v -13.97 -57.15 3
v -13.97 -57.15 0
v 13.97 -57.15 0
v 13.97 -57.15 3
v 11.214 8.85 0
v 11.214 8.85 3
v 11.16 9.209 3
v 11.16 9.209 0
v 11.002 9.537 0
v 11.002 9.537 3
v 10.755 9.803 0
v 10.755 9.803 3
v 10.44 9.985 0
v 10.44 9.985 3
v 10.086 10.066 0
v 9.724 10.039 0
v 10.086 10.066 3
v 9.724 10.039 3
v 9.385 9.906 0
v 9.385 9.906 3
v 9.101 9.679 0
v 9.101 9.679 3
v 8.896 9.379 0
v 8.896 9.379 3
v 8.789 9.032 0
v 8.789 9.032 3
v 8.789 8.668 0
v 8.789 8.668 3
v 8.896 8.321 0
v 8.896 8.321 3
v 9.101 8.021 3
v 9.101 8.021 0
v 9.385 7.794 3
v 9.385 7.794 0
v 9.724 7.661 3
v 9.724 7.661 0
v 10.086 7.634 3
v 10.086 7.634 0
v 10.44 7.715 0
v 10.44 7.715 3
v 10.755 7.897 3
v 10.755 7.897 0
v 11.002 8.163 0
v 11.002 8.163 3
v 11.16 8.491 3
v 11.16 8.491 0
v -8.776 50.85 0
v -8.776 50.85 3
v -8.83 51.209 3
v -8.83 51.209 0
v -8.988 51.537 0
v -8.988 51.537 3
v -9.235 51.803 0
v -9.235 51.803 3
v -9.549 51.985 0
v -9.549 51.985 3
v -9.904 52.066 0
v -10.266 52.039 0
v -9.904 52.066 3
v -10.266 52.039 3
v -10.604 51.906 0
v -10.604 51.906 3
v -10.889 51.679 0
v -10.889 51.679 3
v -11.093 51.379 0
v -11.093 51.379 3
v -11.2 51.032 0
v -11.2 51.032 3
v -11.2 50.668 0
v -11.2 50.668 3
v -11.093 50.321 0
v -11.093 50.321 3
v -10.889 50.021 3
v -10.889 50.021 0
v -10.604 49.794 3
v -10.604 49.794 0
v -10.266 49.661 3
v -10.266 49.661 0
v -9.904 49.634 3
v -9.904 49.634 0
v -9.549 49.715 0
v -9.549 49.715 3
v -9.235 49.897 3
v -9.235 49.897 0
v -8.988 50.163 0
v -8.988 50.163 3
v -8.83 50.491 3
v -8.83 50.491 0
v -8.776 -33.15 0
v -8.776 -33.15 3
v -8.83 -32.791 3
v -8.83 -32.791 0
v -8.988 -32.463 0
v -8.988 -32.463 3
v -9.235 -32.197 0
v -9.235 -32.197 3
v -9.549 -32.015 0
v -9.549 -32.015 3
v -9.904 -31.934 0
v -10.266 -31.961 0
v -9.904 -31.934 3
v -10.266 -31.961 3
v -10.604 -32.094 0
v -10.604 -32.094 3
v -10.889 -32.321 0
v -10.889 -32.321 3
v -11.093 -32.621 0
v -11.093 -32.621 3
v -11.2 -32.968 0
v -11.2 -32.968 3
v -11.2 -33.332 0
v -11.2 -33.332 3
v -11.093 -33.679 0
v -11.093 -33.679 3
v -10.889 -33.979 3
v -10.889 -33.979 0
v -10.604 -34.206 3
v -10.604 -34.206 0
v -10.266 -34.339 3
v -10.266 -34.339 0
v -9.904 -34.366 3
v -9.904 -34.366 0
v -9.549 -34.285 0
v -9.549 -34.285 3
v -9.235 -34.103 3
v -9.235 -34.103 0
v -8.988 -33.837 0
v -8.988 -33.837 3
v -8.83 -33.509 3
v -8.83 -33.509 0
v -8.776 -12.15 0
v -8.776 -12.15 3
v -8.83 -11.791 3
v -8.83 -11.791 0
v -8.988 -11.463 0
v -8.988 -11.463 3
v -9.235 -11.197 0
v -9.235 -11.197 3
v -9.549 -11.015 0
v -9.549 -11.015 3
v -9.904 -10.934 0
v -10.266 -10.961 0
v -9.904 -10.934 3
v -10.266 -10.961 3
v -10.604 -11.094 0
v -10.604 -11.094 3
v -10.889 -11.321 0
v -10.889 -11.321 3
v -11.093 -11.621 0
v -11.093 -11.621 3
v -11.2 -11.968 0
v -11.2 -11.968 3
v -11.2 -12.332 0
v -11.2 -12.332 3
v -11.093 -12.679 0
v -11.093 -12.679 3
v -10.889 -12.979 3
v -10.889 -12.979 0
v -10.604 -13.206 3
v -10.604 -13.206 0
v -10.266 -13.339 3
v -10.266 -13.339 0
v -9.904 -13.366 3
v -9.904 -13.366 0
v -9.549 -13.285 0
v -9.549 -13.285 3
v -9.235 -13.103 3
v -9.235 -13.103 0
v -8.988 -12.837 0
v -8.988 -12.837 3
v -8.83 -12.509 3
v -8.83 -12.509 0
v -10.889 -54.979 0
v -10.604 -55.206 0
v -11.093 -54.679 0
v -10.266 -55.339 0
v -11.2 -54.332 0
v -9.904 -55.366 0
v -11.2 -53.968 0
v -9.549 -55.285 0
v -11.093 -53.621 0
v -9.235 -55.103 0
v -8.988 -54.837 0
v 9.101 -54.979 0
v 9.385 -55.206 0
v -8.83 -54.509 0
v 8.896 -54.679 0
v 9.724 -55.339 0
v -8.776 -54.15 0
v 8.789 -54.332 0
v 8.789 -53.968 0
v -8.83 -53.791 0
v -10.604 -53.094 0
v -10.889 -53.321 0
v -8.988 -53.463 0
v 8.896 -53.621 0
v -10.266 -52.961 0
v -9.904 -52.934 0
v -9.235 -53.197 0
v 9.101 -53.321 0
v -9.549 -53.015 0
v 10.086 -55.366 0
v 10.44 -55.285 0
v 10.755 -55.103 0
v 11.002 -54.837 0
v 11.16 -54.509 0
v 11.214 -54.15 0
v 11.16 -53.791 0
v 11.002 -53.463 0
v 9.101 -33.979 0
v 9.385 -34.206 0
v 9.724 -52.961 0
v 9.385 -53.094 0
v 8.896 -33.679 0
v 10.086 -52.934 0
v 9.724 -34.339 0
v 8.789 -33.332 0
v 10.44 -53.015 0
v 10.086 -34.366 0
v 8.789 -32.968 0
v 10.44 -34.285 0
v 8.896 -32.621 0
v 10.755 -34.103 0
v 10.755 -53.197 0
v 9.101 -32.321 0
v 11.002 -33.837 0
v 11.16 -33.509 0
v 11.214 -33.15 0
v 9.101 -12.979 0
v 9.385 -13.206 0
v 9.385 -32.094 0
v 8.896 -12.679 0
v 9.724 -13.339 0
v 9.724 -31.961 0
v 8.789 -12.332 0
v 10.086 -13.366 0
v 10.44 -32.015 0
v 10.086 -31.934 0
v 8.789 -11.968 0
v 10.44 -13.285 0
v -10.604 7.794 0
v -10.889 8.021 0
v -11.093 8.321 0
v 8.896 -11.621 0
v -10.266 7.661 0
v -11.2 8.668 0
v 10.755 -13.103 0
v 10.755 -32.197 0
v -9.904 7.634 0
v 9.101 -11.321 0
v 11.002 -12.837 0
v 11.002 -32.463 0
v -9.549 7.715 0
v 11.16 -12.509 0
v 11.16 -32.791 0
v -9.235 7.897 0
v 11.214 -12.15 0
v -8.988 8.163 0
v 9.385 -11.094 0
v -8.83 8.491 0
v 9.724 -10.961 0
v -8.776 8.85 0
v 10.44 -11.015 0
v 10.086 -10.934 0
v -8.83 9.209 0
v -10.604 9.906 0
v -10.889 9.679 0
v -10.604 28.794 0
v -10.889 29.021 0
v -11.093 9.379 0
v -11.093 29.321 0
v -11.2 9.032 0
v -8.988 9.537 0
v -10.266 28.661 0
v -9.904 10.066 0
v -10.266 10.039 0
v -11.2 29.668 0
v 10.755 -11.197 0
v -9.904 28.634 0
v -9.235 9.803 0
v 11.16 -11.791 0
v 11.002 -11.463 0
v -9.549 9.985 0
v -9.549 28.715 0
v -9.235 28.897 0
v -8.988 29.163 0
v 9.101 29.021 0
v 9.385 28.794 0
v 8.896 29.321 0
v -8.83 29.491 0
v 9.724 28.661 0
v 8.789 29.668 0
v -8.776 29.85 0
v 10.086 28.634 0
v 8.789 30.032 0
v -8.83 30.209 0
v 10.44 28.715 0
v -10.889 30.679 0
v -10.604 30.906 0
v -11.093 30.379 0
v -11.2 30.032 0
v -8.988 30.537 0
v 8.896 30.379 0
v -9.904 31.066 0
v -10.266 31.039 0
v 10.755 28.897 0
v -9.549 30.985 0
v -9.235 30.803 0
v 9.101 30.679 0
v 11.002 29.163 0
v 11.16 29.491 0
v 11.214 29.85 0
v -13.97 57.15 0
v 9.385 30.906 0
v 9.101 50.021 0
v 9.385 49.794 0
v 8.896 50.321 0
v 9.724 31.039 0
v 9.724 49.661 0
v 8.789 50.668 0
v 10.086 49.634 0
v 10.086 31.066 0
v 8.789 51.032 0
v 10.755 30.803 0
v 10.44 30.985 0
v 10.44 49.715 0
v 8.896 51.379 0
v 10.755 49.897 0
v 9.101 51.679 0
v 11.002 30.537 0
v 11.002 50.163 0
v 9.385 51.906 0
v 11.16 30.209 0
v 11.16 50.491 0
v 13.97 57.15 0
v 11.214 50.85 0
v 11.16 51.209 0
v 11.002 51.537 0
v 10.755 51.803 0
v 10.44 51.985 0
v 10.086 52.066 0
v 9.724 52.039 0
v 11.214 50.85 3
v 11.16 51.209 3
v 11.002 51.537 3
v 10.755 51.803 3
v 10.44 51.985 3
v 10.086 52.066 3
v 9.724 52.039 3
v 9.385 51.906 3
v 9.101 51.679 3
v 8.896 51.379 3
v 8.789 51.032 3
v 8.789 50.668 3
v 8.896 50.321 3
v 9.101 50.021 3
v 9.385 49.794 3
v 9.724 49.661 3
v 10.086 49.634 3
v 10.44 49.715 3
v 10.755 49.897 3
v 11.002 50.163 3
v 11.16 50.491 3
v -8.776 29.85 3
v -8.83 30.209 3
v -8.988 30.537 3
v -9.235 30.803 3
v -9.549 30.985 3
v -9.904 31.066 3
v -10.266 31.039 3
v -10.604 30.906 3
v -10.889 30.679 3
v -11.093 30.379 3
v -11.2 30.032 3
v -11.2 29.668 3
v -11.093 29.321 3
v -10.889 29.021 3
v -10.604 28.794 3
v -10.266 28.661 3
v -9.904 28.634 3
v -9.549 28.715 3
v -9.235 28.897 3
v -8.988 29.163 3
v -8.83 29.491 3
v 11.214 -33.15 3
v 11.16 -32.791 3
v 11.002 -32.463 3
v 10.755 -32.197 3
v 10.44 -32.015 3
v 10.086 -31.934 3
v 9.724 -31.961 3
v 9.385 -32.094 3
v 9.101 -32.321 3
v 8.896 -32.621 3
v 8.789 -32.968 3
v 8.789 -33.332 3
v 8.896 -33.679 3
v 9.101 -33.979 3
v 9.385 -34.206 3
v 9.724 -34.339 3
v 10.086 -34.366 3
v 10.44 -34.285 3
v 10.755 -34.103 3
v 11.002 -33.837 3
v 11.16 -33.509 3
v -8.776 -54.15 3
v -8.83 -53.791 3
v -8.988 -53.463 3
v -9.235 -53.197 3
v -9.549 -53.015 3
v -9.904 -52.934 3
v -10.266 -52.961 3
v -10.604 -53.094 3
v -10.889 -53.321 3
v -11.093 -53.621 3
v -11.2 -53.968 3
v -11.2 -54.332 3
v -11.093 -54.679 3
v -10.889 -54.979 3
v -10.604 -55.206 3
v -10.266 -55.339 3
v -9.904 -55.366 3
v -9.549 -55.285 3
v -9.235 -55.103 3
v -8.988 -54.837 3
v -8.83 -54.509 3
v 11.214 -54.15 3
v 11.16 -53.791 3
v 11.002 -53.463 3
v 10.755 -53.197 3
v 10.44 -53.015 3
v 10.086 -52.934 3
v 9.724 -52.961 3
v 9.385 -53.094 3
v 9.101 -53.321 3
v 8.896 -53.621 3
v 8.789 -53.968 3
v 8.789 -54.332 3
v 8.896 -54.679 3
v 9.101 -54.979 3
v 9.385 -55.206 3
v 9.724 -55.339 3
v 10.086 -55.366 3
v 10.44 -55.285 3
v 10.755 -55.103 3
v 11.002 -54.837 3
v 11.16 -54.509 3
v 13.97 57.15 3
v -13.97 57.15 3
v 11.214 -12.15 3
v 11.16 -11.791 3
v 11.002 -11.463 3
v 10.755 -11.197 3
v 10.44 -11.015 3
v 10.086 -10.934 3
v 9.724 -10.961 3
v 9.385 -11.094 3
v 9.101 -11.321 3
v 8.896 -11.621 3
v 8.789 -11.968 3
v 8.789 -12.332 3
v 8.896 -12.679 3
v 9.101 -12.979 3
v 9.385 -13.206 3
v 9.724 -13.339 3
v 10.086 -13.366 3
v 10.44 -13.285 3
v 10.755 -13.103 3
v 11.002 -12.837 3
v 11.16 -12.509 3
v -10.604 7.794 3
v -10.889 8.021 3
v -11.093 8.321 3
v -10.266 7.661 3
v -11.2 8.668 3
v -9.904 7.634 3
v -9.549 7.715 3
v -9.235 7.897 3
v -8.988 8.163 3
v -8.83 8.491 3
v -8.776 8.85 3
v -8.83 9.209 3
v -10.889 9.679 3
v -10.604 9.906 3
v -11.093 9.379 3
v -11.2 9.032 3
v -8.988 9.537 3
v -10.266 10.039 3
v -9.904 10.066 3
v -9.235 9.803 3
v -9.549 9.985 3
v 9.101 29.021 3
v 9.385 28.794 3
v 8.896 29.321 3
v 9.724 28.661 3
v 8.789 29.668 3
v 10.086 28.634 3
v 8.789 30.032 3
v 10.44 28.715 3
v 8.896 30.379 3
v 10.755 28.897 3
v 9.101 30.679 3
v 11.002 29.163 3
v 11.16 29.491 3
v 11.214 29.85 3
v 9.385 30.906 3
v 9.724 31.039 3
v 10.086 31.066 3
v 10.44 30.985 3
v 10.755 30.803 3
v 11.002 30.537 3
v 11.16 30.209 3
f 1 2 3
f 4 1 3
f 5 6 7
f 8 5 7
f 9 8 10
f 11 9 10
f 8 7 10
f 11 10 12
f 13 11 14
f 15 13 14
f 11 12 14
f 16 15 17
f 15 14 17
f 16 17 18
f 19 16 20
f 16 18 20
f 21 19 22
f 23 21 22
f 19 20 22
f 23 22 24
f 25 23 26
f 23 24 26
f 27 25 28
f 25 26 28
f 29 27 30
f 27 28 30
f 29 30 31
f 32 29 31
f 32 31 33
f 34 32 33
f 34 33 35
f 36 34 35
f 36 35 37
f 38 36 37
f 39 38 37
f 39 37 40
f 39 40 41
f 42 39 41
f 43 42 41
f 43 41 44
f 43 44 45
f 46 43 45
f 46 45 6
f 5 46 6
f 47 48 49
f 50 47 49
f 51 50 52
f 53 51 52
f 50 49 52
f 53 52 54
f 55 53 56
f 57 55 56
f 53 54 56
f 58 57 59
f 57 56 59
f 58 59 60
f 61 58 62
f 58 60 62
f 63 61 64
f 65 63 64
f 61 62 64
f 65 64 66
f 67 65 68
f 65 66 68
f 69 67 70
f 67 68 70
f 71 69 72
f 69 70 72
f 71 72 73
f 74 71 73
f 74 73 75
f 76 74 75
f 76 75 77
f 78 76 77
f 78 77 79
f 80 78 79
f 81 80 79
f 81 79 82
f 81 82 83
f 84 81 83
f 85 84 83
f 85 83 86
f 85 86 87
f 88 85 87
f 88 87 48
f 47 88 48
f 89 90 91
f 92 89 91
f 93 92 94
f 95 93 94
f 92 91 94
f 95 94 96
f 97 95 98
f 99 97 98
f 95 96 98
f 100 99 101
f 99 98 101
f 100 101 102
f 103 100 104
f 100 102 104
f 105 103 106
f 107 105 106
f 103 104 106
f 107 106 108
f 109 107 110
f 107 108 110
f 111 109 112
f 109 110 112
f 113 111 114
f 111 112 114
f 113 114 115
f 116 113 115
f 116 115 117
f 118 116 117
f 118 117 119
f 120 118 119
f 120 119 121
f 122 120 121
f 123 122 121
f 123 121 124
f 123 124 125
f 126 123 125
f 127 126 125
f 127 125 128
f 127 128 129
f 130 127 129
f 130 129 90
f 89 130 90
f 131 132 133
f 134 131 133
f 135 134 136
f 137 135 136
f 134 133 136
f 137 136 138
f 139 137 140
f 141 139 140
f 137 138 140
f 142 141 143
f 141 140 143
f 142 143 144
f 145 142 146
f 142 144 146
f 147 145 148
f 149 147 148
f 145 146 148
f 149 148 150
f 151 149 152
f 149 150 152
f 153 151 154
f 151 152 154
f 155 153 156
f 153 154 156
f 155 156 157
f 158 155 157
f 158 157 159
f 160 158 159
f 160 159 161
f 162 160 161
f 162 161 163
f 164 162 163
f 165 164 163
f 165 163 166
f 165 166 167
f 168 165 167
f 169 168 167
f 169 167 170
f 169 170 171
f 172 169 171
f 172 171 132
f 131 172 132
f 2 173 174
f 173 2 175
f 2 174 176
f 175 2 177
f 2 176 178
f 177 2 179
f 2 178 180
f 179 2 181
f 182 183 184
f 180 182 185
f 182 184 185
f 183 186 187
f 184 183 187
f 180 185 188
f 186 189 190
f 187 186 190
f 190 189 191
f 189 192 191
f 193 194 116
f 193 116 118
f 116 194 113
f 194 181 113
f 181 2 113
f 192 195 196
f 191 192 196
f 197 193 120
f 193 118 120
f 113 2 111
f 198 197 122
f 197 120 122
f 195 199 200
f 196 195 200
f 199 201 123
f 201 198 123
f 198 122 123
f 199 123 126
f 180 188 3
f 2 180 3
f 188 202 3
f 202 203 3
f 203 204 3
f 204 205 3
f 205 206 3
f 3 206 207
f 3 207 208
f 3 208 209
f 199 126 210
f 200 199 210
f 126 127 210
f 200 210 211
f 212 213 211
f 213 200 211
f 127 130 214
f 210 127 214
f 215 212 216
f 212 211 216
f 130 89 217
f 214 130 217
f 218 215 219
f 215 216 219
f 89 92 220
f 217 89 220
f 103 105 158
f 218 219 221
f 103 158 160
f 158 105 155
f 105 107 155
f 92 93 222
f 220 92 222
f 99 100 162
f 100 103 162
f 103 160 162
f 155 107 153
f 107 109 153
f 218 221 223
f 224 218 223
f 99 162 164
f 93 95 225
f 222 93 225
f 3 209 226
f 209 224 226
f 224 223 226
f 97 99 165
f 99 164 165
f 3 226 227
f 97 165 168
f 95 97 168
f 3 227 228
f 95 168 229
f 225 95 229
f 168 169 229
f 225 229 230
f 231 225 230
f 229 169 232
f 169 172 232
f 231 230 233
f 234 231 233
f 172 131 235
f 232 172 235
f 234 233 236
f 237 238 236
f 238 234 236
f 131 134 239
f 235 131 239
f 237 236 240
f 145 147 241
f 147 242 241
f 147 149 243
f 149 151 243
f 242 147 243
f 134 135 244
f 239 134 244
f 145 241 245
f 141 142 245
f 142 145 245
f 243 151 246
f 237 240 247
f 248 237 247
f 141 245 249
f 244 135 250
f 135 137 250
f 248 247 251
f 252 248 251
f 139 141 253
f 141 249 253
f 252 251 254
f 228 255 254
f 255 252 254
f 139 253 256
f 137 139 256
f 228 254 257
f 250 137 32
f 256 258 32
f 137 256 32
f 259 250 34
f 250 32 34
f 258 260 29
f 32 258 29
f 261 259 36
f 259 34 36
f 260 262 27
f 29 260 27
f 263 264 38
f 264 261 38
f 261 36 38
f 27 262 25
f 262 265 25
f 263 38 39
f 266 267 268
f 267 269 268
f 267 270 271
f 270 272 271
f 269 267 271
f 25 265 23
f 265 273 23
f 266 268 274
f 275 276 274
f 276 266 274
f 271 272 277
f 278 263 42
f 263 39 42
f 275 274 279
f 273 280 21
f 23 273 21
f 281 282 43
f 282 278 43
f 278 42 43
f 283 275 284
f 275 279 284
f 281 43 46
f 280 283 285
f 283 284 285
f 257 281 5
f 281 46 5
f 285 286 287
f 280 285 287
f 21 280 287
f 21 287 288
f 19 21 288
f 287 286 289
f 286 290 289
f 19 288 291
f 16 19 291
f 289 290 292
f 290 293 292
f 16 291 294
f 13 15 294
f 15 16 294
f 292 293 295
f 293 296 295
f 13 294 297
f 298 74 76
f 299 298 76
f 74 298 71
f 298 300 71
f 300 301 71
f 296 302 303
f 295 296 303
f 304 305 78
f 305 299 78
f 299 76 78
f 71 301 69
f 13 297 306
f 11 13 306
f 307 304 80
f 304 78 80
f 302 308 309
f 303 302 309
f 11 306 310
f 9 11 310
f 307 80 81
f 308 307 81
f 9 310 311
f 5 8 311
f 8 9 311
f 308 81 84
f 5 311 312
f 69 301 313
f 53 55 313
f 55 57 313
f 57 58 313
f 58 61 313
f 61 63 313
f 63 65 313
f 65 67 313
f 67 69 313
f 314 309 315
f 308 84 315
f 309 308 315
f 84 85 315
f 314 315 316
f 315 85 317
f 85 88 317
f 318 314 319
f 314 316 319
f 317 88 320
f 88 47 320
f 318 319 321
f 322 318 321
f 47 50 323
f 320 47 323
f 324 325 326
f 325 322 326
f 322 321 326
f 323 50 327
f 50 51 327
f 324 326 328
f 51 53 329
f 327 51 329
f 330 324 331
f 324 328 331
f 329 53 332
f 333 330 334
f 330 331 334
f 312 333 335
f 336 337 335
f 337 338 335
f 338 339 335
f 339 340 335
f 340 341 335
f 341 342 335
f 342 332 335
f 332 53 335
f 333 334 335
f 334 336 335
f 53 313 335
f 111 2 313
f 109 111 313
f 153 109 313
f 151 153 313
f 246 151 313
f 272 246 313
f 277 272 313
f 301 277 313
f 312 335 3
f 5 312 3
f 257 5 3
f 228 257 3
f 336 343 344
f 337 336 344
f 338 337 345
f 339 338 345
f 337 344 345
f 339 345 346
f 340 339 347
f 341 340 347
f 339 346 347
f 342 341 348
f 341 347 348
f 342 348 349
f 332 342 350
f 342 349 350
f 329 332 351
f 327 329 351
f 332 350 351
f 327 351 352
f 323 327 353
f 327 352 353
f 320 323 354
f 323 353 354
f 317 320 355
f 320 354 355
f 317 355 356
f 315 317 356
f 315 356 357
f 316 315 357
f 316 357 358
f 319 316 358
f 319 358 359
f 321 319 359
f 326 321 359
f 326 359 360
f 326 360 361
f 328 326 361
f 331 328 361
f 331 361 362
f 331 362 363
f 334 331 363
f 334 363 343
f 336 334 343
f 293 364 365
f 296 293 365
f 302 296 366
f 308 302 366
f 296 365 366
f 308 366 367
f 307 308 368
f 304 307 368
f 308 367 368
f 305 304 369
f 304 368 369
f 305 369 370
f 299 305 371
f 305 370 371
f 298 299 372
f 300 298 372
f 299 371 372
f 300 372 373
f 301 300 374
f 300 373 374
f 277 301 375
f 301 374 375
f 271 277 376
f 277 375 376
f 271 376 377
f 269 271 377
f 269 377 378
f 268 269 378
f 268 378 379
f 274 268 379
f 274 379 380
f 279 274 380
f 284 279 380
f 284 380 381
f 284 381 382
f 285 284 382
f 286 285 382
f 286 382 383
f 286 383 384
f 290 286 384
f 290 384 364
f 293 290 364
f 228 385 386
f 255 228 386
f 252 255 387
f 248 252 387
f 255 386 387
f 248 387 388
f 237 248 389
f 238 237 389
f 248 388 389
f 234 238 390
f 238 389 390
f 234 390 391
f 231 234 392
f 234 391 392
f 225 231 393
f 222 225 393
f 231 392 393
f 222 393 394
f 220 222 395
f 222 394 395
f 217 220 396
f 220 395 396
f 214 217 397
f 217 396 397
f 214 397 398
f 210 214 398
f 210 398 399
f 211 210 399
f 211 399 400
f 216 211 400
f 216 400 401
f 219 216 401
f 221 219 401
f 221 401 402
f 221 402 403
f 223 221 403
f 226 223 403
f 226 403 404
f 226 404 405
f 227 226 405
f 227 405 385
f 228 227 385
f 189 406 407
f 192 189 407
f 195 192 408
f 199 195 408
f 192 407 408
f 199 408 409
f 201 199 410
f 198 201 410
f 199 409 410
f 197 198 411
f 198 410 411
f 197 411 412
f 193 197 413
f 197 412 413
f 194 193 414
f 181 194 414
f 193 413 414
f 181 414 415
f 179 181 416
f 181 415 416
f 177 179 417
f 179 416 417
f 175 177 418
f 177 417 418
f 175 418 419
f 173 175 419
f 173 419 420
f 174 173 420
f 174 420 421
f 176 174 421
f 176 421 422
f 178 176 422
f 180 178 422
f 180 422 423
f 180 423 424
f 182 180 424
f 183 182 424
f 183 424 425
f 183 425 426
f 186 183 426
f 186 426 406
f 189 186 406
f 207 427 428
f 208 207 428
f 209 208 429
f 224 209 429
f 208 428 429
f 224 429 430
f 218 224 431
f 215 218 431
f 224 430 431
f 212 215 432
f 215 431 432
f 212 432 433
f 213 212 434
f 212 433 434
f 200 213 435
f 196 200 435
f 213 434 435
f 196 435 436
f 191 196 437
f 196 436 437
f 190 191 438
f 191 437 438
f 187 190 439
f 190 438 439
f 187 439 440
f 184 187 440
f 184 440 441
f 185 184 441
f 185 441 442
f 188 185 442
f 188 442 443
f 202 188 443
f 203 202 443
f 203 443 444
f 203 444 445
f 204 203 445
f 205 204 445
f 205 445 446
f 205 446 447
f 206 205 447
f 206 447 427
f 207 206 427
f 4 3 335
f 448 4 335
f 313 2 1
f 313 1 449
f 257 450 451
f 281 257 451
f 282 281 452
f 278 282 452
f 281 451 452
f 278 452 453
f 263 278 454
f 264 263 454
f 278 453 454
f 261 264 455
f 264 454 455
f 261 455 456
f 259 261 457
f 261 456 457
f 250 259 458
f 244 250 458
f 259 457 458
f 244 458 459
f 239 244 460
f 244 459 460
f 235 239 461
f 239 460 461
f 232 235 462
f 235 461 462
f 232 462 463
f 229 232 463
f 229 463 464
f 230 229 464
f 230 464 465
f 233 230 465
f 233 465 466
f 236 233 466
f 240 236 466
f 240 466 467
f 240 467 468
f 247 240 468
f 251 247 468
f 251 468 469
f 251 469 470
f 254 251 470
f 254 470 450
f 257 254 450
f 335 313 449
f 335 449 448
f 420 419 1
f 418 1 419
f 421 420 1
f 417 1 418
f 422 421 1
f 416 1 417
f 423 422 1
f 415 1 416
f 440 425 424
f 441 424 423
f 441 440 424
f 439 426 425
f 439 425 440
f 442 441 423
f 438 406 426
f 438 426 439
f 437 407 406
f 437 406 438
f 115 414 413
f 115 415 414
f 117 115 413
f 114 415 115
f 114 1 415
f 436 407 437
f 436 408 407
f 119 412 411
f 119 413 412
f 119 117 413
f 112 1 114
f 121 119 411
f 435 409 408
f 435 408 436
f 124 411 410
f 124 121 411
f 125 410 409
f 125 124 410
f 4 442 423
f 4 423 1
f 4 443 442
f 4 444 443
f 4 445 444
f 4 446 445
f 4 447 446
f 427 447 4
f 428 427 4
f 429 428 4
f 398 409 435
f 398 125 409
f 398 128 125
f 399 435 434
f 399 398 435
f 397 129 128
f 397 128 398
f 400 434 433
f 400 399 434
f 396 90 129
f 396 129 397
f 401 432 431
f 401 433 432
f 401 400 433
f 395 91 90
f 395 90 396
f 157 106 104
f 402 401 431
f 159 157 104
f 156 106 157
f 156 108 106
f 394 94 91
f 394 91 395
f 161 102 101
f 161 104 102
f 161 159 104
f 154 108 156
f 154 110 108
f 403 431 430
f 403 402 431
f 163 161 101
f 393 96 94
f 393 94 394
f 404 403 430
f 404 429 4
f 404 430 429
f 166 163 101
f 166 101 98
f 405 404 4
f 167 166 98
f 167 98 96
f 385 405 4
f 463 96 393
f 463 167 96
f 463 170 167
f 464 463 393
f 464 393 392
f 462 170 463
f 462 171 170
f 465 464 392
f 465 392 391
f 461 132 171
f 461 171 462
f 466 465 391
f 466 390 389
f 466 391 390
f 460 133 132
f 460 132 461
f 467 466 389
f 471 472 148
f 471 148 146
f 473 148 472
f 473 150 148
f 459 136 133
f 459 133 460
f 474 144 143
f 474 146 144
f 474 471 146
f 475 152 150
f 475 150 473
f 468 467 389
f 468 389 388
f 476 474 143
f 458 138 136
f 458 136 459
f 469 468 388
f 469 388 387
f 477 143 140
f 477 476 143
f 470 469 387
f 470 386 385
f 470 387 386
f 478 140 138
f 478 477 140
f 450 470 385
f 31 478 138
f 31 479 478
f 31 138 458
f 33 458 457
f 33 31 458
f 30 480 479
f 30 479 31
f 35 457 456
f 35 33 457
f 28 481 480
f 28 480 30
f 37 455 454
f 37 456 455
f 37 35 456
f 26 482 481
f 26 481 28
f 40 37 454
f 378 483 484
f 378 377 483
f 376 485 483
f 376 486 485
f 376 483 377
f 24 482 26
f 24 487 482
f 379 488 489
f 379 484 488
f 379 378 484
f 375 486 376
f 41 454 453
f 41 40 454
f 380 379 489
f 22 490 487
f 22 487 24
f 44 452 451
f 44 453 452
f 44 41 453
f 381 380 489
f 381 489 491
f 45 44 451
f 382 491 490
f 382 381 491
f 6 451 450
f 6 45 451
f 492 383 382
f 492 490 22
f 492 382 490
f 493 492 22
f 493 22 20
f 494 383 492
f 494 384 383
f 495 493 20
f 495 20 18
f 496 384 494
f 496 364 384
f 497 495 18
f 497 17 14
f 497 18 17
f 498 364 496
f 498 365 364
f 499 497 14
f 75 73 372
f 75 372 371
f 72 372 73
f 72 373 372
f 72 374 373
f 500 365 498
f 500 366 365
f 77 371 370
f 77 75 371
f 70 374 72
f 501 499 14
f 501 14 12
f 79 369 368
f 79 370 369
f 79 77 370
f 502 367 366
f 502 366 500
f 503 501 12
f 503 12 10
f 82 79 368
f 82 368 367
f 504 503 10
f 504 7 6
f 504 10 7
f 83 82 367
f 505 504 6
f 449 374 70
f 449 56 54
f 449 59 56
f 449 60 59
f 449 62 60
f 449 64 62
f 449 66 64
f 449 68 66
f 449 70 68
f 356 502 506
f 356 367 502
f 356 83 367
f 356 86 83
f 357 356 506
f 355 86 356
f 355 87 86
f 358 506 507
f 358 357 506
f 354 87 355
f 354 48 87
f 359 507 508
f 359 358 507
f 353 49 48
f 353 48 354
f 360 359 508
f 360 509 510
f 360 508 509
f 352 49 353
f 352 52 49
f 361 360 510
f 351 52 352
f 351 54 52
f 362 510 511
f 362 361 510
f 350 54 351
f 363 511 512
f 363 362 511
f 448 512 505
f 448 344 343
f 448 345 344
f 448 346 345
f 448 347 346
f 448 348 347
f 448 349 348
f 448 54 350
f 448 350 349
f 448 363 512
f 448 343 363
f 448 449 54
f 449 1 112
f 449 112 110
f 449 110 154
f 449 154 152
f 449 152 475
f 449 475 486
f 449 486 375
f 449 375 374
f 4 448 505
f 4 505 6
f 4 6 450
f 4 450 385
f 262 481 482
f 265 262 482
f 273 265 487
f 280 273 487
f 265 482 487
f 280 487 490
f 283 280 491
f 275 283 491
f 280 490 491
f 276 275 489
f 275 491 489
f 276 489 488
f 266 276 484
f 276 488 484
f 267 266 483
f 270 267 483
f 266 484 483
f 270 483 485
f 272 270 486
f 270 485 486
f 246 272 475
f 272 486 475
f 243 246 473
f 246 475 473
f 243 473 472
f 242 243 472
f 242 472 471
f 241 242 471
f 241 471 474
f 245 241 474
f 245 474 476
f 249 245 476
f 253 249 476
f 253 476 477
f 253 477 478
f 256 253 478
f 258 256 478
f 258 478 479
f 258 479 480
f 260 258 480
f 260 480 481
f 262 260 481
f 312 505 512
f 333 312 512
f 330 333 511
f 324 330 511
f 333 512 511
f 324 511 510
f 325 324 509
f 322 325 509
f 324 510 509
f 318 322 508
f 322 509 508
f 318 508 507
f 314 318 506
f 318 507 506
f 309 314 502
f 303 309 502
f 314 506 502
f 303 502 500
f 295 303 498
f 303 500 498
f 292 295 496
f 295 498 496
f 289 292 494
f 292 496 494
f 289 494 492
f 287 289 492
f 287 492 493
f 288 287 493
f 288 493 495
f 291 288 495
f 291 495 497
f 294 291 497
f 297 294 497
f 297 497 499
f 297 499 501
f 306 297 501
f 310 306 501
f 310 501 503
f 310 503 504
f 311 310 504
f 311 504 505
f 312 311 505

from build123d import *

# Parameters (mm, degrees)
SKETCH1_W           = 27.94
SKETCH1_H           = 114.3
BOSS_EXTRUDE1_DEPTH = 3
SKETCH2_R           = 1.2192
CUT_EXTRUDE1_DEPTH  = 59.90911135
LPATTERN1_COUNT     = 6
LPATTERN1_PITCH     = 21


with BuildPart() as part:
    # Sketch1 → Boss-Extrude1 (new body)
    with BuildSketch(Plane.XY):
        Rectangle(SKETCH1_W, SKETCH1_H)
    extrude(amount=BOSS_EXTRUDE1_DEPTH)

    # Sketch2 → Cut-Extrude1 (cut, through all)
    with BuildSketch(Plane.XY.offset(3)):
        with Locations((-9.9949, -54.15)):
            Circle(SKETCH2_R)
        with Locations((9.9949, -54.15)):
            Circle(SKETCH2_R)
    cut_extrude1 = extrude(amount=-CUT_EXTRUDE1_DEPTH, mode=Mode.SUBTRACT)

    # LPattern1: Cut-Extrude1 ×6
    with Locations(*[(0, i * LPATTERN1_PITCH, 0) for i in range(1, LPATTERN1_COUNT)]):
        add(cut_extrude1, mode=Mode.SUBTRACT)


solid = part.part
